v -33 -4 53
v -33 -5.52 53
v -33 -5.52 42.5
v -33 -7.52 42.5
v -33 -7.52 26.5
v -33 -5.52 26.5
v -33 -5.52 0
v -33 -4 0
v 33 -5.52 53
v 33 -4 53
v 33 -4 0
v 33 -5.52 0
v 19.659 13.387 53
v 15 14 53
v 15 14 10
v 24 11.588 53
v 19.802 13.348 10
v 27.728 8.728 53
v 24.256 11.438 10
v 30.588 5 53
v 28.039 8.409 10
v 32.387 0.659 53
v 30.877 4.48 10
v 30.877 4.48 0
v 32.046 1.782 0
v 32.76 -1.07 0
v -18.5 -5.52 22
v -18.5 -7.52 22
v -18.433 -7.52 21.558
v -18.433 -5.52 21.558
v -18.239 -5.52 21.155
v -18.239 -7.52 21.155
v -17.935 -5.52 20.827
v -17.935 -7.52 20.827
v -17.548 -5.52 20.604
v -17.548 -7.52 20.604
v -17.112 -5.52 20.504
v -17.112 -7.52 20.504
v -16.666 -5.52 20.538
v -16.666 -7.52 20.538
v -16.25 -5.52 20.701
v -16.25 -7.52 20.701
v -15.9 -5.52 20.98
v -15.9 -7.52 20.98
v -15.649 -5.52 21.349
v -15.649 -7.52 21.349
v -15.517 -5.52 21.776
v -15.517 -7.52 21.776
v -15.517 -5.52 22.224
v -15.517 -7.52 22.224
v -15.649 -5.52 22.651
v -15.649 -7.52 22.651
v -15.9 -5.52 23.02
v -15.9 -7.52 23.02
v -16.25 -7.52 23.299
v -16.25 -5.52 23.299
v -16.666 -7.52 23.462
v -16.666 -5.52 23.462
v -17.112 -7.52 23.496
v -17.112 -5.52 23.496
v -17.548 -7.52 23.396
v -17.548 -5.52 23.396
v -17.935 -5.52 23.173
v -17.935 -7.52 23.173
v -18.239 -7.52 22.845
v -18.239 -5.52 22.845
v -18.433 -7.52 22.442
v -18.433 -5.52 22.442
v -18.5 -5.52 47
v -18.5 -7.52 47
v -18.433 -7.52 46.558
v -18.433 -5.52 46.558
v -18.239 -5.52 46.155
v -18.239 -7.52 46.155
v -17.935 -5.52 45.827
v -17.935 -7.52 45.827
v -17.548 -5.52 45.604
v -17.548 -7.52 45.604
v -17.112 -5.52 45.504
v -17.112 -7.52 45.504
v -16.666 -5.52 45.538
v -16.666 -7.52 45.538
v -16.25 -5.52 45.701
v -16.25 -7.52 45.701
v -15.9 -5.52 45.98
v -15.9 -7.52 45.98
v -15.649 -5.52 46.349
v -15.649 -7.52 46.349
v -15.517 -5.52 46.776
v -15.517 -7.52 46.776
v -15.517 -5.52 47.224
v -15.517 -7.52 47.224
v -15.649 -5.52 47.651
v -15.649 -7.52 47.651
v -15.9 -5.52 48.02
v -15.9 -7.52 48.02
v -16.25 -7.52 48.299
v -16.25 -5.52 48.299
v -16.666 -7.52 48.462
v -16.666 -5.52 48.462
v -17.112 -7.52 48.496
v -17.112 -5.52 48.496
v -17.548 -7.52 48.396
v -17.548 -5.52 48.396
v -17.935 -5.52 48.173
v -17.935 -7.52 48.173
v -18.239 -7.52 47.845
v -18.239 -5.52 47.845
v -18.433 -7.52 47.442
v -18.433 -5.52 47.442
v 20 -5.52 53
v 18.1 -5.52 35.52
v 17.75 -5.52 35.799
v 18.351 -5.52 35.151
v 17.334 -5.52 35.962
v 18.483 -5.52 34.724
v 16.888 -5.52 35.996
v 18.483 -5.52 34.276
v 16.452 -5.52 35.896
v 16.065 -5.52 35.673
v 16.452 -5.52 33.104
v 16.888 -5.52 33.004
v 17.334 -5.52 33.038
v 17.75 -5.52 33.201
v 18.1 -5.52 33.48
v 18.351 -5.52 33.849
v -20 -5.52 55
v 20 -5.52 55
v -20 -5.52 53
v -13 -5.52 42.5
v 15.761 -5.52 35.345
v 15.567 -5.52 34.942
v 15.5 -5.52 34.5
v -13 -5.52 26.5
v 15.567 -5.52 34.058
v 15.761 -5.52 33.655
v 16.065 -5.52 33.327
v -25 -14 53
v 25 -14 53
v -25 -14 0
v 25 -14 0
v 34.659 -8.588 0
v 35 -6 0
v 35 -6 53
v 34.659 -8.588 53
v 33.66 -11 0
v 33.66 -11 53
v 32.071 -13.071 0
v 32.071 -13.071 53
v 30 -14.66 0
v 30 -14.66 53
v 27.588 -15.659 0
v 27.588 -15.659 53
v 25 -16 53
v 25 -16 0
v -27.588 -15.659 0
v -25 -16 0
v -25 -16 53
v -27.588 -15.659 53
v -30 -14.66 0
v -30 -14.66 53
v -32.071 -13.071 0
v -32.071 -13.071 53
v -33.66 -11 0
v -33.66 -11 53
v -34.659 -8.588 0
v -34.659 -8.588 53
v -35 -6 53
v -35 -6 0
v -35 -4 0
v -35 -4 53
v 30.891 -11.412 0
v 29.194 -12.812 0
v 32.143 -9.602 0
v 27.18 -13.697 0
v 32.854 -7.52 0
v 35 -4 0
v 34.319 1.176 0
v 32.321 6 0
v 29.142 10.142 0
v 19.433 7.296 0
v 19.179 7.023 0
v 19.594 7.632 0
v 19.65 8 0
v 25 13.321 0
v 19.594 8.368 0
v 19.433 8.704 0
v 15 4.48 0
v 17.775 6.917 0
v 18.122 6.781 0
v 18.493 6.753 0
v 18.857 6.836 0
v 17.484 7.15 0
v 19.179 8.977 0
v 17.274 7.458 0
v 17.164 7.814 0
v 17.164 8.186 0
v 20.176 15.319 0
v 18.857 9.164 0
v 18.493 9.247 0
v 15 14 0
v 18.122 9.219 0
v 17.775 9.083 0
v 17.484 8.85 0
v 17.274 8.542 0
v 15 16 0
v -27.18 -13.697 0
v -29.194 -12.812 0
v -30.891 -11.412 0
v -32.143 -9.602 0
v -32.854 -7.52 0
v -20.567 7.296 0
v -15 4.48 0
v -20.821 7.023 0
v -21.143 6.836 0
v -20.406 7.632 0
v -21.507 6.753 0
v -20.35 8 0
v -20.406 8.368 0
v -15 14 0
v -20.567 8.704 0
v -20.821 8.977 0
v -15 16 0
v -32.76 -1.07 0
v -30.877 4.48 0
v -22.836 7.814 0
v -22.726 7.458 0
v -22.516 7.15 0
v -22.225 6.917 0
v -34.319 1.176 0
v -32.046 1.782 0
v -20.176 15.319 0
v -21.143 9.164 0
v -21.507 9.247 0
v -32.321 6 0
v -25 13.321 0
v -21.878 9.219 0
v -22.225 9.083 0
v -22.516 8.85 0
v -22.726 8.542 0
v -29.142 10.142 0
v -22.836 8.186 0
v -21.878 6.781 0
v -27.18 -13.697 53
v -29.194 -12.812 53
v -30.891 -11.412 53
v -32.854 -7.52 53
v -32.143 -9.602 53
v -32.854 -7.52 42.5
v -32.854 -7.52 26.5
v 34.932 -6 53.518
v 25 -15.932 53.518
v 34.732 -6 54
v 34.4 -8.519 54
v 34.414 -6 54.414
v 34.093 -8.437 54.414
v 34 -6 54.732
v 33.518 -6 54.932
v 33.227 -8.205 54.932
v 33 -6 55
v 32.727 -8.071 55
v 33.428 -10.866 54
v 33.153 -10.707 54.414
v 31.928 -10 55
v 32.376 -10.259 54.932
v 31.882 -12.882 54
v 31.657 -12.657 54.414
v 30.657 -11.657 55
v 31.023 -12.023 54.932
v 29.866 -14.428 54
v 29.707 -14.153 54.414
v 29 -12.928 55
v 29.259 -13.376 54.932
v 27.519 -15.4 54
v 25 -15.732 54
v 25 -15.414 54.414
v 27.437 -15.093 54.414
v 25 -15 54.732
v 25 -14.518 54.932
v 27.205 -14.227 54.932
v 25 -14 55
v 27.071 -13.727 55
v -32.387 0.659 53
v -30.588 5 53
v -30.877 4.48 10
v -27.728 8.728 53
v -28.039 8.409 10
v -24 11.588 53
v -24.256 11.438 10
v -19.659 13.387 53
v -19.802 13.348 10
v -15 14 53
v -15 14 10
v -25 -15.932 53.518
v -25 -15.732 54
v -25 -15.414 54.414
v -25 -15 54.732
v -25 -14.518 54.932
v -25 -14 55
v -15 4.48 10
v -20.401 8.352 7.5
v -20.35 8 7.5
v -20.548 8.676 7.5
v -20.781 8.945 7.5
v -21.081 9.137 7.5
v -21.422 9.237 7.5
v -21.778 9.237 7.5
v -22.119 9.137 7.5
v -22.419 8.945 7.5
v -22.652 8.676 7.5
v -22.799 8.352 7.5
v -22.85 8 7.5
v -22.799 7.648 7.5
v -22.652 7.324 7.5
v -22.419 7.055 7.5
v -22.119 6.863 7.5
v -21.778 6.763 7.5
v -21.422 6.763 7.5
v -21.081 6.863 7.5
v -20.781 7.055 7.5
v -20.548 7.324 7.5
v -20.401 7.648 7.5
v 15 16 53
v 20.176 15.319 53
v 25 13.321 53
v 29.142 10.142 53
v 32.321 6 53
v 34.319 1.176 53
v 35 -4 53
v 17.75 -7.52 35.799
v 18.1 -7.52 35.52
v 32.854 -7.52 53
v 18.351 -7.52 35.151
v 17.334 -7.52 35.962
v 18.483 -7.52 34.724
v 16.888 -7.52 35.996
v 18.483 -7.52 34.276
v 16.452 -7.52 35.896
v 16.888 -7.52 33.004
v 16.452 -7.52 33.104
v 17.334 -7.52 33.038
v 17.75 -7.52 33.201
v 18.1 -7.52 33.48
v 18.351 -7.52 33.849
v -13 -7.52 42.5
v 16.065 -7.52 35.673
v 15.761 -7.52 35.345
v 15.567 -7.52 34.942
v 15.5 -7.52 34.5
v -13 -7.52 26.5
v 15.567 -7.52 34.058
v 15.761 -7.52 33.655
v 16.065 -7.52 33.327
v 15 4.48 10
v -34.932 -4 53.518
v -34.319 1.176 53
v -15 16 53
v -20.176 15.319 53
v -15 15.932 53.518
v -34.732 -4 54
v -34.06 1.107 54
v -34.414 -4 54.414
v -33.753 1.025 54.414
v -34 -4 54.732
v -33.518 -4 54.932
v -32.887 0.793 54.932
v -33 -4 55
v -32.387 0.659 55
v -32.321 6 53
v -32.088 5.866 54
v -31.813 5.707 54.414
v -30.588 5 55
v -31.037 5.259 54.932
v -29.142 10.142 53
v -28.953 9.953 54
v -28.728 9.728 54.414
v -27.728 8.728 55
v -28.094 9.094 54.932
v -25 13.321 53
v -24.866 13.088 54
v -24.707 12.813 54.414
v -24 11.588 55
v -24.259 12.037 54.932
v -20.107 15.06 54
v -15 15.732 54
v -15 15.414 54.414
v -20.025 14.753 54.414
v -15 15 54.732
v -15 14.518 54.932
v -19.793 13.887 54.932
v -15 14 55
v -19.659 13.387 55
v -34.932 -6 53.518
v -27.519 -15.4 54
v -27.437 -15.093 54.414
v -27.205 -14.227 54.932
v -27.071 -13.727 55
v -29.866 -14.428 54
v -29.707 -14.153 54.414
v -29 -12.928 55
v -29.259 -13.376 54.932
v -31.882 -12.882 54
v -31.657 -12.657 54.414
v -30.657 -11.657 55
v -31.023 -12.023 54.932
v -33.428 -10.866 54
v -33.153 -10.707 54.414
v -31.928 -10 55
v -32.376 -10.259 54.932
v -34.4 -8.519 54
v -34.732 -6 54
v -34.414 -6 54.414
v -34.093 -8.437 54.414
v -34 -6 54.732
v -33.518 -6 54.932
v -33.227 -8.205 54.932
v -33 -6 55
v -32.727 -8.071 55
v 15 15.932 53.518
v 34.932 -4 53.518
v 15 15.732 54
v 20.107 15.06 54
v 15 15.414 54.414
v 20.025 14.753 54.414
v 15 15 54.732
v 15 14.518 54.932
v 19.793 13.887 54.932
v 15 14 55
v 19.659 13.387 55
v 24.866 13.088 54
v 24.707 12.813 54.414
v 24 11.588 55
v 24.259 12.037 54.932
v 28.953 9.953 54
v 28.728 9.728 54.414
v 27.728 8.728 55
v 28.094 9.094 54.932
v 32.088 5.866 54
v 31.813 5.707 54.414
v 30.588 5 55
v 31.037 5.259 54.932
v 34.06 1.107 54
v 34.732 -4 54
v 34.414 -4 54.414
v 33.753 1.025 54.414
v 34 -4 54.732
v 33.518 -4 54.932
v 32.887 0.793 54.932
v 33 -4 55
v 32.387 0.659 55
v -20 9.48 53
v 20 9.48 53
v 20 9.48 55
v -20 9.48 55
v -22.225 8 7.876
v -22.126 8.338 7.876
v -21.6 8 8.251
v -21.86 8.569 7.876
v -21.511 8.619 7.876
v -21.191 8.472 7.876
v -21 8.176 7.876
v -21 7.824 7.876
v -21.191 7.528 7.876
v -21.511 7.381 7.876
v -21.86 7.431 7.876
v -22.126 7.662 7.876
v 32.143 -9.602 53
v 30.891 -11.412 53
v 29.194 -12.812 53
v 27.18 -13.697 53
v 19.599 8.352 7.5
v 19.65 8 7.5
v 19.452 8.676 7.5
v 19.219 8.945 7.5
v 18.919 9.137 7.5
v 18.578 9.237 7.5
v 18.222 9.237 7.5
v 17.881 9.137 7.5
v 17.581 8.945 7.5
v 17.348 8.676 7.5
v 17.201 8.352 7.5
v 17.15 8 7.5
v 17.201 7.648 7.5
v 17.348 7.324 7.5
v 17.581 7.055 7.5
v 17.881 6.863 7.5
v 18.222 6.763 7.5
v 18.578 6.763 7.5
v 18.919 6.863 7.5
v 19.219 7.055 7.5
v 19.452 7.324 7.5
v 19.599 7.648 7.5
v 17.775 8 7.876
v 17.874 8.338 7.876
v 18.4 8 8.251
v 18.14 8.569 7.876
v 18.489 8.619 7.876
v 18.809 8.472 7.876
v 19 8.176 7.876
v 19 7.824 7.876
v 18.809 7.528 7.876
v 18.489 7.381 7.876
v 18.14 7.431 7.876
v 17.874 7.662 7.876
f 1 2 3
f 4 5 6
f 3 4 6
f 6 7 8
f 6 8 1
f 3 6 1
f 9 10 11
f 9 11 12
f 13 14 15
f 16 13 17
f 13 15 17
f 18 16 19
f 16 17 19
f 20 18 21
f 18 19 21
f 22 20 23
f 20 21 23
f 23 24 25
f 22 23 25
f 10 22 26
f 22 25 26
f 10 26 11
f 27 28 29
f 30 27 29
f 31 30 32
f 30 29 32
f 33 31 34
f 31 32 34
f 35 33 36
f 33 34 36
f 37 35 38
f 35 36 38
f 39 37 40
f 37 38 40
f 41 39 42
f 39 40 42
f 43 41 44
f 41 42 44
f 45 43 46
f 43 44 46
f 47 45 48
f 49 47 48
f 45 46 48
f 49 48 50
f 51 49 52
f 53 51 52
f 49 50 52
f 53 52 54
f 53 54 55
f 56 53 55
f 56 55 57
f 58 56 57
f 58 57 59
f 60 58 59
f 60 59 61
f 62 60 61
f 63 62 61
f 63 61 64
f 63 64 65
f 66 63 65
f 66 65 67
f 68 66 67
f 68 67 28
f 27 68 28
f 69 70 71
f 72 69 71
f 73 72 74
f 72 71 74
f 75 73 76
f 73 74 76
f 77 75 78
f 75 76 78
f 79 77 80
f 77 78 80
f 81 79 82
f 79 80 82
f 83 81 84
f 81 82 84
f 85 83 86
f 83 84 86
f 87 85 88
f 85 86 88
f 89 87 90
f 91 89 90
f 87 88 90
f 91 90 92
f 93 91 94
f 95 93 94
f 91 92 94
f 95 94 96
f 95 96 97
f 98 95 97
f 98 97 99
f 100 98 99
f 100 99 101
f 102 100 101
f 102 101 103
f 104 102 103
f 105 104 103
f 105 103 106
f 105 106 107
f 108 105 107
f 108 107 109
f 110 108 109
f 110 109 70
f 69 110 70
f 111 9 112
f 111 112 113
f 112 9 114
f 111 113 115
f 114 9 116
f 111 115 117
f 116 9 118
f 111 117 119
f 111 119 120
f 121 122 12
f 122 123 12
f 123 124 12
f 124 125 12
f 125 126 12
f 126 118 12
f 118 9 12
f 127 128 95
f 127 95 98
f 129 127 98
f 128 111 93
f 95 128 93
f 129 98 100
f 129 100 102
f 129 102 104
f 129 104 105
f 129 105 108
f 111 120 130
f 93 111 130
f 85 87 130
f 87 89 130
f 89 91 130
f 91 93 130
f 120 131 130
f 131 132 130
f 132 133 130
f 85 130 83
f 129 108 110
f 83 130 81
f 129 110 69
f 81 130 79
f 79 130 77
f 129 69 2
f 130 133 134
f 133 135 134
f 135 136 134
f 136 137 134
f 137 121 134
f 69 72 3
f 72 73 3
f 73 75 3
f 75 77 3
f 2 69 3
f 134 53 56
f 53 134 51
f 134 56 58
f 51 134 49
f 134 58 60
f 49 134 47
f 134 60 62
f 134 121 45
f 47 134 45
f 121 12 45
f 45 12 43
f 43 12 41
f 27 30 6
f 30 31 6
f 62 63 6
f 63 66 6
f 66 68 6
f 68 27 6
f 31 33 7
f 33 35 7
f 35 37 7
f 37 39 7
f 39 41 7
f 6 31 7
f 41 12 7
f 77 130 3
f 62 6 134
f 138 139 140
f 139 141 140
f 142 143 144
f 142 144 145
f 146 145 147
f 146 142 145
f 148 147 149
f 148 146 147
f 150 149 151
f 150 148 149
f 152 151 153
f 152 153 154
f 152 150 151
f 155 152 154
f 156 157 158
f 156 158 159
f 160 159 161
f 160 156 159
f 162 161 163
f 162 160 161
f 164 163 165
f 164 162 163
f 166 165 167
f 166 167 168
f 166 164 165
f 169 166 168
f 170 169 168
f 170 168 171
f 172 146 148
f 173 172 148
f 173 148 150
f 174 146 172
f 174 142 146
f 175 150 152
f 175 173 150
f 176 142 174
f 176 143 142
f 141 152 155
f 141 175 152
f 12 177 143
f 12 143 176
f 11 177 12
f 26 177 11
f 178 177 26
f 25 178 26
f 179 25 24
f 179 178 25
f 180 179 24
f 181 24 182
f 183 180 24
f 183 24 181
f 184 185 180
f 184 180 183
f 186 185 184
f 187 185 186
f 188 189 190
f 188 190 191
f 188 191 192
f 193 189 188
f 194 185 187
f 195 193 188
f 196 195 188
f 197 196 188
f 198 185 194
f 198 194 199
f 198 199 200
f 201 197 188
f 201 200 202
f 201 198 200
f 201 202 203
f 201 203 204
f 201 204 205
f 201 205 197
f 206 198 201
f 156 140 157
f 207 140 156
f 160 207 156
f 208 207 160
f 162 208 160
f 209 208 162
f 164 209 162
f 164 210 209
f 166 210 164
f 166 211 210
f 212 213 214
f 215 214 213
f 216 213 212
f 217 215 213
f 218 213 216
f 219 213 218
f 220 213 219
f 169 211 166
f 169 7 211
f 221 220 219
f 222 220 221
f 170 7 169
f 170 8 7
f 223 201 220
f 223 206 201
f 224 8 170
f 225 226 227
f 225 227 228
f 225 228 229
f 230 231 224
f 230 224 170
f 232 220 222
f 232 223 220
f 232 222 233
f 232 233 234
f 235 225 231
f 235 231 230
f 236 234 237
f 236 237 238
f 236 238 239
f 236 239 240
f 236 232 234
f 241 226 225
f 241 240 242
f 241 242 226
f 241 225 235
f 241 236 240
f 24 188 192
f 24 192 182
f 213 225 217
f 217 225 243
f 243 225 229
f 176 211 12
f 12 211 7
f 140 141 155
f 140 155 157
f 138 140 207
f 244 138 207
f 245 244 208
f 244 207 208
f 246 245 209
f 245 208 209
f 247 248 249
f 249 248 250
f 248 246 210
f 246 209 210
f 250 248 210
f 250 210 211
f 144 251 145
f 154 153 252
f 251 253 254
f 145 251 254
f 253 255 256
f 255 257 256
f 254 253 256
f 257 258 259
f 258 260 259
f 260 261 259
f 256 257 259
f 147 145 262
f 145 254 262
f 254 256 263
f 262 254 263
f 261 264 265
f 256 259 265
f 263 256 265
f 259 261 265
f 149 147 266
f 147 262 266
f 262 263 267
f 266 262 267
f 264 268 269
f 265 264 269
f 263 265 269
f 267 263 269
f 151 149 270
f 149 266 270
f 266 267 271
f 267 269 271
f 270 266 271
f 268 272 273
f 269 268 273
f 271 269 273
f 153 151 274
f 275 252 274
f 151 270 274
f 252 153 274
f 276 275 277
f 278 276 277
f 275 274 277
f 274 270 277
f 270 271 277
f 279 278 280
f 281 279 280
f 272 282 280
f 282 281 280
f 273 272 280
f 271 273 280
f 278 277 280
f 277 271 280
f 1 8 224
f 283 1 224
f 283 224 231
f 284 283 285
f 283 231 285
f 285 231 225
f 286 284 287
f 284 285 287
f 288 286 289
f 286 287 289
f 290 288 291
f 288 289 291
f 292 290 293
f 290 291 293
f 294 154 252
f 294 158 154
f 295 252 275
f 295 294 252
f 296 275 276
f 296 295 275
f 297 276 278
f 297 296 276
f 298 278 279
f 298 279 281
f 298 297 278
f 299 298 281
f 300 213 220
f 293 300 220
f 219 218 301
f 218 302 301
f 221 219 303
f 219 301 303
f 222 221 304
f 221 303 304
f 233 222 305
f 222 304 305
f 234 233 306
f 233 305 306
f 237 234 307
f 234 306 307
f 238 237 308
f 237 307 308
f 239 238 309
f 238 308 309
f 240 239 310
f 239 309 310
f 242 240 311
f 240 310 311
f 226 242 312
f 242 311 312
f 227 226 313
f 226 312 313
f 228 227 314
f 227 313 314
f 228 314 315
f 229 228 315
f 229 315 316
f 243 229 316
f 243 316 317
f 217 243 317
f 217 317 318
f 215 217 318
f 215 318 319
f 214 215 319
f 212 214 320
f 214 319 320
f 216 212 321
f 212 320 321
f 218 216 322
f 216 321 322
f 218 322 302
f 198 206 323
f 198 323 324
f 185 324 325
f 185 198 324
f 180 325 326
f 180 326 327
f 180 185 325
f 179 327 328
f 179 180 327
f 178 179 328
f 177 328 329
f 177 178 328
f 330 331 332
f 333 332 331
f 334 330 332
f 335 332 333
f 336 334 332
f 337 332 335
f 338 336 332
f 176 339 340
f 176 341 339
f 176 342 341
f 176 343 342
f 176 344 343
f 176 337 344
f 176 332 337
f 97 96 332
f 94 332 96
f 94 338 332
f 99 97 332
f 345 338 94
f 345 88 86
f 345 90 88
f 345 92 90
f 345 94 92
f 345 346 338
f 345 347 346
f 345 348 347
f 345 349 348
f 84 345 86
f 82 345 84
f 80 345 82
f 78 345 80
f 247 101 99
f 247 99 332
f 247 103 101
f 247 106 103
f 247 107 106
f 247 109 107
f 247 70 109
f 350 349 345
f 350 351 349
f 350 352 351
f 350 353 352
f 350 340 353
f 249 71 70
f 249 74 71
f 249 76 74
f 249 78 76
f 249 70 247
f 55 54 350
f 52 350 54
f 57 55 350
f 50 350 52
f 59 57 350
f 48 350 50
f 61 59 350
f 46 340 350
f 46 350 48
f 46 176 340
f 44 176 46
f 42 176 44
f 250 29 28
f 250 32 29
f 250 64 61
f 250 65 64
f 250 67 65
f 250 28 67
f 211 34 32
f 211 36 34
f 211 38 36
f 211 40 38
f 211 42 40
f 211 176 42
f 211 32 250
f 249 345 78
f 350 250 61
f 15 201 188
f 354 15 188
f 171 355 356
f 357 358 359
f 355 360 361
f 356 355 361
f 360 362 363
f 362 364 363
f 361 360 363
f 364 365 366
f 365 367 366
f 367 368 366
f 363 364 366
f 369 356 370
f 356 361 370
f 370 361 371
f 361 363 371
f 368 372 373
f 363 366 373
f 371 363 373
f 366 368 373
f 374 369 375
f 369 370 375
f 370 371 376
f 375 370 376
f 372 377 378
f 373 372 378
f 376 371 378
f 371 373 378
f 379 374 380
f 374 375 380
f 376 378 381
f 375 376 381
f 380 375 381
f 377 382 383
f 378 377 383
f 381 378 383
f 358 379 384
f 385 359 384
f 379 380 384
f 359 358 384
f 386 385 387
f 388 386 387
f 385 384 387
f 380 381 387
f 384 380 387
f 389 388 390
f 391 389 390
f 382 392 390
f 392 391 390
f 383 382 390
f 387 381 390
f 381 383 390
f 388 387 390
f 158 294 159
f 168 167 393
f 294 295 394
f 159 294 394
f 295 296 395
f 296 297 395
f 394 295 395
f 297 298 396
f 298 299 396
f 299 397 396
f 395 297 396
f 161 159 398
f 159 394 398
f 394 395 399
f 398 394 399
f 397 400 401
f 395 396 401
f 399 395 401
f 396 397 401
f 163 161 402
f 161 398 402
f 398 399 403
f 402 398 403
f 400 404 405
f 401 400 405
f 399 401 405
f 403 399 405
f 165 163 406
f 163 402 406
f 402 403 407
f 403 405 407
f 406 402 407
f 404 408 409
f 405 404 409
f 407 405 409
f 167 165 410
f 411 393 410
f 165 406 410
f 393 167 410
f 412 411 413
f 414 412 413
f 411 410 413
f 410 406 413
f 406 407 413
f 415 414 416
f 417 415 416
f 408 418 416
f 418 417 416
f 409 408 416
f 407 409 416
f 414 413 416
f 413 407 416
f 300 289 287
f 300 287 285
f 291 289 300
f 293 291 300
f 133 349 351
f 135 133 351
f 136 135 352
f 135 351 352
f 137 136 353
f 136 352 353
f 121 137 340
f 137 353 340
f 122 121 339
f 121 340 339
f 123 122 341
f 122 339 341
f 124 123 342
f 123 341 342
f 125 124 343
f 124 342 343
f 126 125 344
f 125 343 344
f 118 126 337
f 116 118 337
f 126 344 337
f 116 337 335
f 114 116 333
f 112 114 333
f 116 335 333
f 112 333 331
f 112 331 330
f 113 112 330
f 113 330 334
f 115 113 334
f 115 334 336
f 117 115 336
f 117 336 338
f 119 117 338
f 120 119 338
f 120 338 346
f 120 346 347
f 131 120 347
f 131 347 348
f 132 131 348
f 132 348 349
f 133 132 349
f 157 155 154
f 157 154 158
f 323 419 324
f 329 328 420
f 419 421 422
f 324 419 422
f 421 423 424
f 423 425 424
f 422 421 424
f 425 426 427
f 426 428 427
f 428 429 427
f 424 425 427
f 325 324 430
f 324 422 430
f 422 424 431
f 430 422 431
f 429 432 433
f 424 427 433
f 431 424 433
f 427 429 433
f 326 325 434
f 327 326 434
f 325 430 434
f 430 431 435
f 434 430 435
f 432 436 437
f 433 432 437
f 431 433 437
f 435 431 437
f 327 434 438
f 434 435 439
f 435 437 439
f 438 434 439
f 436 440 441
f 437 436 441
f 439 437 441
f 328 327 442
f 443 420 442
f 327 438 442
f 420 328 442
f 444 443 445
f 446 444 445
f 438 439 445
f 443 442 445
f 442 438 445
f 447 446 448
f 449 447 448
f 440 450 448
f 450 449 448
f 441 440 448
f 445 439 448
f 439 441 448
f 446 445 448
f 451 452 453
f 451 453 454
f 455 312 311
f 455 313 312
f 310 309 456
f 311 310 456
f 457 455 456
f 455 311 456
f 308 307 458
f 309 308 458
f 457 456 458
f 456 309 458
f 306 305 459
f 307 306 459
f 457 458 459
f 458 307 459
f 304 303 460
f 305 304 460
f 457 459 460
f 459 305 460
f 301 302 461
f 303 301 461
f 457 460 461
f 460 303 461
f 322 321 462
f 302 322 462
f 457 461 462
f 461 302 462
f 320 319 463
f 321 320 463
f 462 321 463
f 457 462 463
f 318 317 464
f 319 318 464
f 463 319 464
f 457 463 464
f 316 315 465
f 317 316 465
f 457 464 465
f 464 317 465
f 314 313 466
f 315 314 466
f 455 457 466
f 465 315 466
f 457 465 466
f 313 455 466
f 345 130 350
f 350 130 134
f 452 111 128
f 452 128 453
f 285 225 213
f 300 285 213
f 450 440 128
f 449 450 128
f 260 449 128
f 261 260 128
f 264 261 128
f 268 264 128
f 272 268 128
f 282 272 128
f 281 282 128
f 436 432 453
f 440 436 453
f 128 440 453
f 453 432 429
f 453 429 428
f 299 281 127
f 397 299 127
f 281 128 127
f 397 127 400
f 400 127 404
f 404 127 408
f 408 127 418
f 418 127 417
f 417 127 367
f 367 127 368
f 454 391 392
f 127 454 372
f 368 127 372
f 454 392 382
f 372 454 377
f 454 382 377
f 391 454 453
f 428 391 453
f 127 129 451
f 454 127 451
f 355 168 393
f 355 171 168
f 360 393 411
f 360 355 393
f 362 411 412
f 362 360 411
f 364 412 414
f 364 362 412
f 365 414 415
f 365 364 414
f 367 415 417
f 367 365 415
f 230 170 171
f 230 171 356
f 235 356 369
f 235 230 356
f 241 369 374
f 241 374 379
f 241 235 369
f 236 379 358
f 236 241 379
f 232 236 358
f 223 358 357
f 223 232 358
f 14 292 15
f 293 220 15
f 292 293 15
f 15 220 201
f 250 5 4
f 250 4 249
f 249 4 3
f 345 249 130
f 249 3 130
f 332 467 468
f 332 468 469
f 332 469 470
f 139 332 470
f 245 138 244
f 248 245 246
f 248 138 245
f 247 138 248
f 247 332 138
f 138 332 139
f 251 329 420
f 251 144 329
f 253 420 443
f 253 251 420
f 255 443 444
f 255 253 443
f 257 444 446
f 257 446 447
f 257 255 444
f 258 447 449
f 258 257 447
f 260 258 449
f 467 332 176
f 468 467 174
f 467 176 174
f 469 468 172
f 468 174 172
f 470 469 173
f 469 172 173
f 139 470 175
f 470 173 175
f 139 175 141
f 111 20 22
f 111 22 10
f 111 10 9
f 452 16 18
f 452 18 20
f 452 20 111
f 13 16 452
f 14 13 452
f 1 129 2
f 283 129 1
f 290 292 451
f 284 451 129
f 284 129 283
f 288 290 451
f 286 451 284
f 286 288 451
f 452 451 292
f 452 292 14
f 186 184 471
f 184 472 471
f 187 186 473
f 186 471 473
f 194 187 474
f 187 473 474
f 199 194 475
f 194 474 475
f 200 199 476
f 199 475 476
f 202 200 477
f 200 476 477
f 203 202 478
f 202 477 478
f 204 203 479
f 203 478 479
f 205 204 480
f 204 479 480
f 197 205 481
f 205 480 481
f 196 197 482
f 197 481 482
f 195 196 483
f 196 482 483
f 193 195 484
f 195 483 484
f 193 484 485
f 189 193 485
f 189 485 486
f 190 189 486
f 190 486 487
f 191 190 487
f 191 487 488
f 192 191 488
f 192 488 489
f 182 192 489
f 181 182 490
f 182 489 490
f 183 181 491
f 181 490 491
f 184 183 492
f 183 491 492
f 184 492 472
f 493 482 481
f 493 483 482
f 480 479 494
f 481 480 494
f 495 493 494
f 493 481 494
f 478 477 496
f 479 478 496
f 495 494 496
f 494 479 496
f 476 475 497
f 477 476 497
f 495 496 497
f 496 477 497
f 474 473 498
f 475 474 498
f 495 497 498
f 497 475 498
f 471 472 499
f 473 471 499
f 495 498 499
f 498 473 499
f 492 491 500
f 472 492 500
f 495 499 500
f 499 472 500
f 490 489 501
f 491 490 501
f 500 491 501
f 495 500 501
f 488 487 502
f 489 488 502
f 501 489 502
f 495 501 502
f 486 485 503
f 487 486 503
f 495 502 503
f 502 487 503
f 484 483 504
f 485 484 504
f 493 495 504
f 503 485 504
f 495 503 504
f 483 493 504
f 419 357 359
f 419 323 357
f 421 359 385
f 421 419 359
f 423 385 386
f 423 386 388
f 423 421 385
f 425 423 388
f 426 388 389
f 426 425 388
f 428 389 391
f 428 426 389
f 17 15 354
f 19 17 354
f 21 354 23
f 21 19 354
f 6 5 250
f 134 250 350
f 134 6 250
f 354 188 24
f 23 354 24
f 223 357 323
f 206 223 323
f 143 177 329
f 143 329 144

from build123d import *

# Parameters (mm, degrees)
BOSS_EXTRUDE1_DEPTH       = 55
SHELL1_T                  = -2
BOSS_EXTRUDE2_DEPTH       = 10
M3X0_5_TAPPED_HOLE1_D     = 2.5
M3X0_5_TAPPED_HOLE1_DEPTH = 7.5
M3X0_5_TAPPED_HOLE1_TIP   = 0.751075774
BOSS_EXTRUDE3_REACH       = 69.127
SKETCH5_W                 = 66
SKETCH5_H                 = 2
SKETCH6_W                 = 40
SKETCH6_H                 = 15
CUT_EXTRUDE1_DEPTH        = 10
F_3_0MM_DOWEL_HOLE1_D     = 3
F_3_0MM_DOWEL_HOLE1_DEPTH = 4
F_3_0MM_DOWEL_HOLE1_TIP   = 0.901290929
SKETCH9_W                 = 20
SKETCH9_H                 = 16
CUT_EXTRUDE2_DEPTH        = 2
FILLET1_R                 = 2


with BuildPart() as part:
    # Sketch1 → Boss-Extrude1 (new body)
    with BuildSketch(Plane.XY):
        with BuildLine():
            Line((-15, 16), (15, 16))
            ThreePointArc((15, 16), (29.142135624, 10.142135624), (35, -4))
            Line((35, -4), (35, -6))
            ThreePointArc((35, -6), (32.071067812, -13.071067812), (25, -16))
            Line((25, -16), (-25, -16))
            ThreePointArc((-25, -16), (-32.071067812, -13.071067812), (-35, -6))
            Line((-35, -6), (-35, -4))
            ThreePointArc((-35, -4), (-29.142135624, 10.142135624), (-15, 16))
        make_face()
    extrude(amount=BOSS_EXTRUDE1_DEPTH)

    # Shell1
    shell1_openings = [part.faces().sort_by_distance(p)[0] for p in [
        (0, -0.685833175, 0),
    ]]
    offset(amount=SHELL1_T, openings=shell1_openings, kind=Kind.INTERSECTION)

    # Sketch2 → Boss-Extrude2 (add)
    with BuildSketch(Plane(origin=(0, 0, 0), x_dir=(-1, 0, 0), z_dir=(0, 0, -1))):
        with BuildLine():
            Line((-15, 4.48), (-30.87732975, 4.48))
            ThreePointArc((-30.87732975, 4.48), (-24.256349172, 11.437616396), (-15, 14))
            Line((-15, 14), (-15, 4.48))
        make_face()
        with BuildLine():
            Line((15, 4.48), (15, 14))
            ThreePointArc((15, 14), (24.256349172, 11.437616396), (30.87732975, 4.48))
            Line((30.87732975, 4.48), (15, 4.48))
        make_face()
    extrude(amount=-BOSS_EXTRUDE2_DEPTH)

    # M3x0.5 Tapped Hole1
    with Locations(Plane(origin=(0, 0, 0), x_dir=(-1, 0, 0), z_dir=(0, 0, -1))):
        with Locations((-18.4, 8), (21.6, 8)):
            Hole(M3X0_5_TAPPED_HOLE1_D / 2, depth=M3X0_5_TAPPED_HOLE1_DEPTH)
            with Locations((0, 0, -(M3X0_5_TAPPED_HOLE1_DEPTH + M3X0_5_TAPPED_HOLE1_TIP / 2))):  # 118° drill point
                Cone(0, M3X0_5_TAPPED_HOLE1_D / 2, M3X0_5_TAPPED_HOLE1_TIP, mode=Mode.SUBTRACT)

    # Sketch5 → Boss-Extrude3 (add, up to next)
    with BuildSketch(Plane(origin=(0, 0, 0), x_dir=(-1, 0, 0), z_dir=(0, 0, -1)), mode=Mode.PRIVATE) as boss_extrude3_sk1:
        with Locations((0, -6.52)):
            Rectangle(SKETCH5_W, SKETCH5_H)
    boss_extrude3_tool1 = extrude(boss_extrude3_sk1.sketch, amount=-BOSS_EXTRUDE3_REACH, mode=Mode.PRIVATE) - part.part
    add(boss_extrude3_tool1.solids().sort_by_distance((0, -6.52, 0))[0])

    # Sketch6 → Cut-Extrude1 (cut)
    with BuildSketch(Plane(origin=(0, 0, 53), x_dir=(-1, 0, 0), z_dir=(0, 0, -1))):
        with Locations((0, 1.98)):
            Rectangle(SKETCH6_W, SKETCH6_H)
    extrude(amount=-CUT_EXTRUDE1_DEPTH, mode=Mode.SUBTRACT)

    # Ø3.0mm Dowel Hole1
    with Locations(Plane(origin=(0, -5.52, 0), x_dir=(1, 0, 0), z_dir=(0, 1, 0))):
        with Locations((-17, -47), (-17, -22), (17, -34.5)):
            Hole(F_3_0MM_DOWEL_HOLE1_D / 2, depth=F_3_0MM_DOWEL_HOLE1_DEPTH)
            with Locations((0, 0, -(F_3_0MM_DOWEL_HOLE1_DEPTH + F_3_0MM_DOWEL_HOLE1_TIP / 2))):  # 118° drill point
                Cone(0, F_3_0MM_DOWEL_HOLE1_D / 2, F_3_0MM_DOWEL_HOLE1_TIP, mode=Mode.SUBTRACT)

    # Sketch9 → Cut-Extrude2 (cut)
    with BuildSketch(Plane(origin=(0, -5.52, 0), x_dir=(1, 0, 0), z_dir=(0, 1, 0))):
        with Locations((-23, -34.5)):
            Rectangle(SKETCH9_W, SKETCH9_H)
    extrude(amount=-CUT_EXTRUDE2_DEPTH, mode=Mode.SUBTRACT)

    # Fillet1
    fillet1_edges = [part.edges().sort_by_distance(p)[0] for p in [
        (29.142135624, 10.142135624, 55),
        (0, 16, 55),
        (-29.142135624, 10.142135624, 55),
        (-35, -5, 55),
        (-32.071067812, -13.071067812, 55),
        (0, -16, 55),
        (32.071067812, -13.071067812, 55),
        (35, -5, 55),
    ]]
    fillet(fillet1_edges, radius=FILLET1_R)


solid = part.part
